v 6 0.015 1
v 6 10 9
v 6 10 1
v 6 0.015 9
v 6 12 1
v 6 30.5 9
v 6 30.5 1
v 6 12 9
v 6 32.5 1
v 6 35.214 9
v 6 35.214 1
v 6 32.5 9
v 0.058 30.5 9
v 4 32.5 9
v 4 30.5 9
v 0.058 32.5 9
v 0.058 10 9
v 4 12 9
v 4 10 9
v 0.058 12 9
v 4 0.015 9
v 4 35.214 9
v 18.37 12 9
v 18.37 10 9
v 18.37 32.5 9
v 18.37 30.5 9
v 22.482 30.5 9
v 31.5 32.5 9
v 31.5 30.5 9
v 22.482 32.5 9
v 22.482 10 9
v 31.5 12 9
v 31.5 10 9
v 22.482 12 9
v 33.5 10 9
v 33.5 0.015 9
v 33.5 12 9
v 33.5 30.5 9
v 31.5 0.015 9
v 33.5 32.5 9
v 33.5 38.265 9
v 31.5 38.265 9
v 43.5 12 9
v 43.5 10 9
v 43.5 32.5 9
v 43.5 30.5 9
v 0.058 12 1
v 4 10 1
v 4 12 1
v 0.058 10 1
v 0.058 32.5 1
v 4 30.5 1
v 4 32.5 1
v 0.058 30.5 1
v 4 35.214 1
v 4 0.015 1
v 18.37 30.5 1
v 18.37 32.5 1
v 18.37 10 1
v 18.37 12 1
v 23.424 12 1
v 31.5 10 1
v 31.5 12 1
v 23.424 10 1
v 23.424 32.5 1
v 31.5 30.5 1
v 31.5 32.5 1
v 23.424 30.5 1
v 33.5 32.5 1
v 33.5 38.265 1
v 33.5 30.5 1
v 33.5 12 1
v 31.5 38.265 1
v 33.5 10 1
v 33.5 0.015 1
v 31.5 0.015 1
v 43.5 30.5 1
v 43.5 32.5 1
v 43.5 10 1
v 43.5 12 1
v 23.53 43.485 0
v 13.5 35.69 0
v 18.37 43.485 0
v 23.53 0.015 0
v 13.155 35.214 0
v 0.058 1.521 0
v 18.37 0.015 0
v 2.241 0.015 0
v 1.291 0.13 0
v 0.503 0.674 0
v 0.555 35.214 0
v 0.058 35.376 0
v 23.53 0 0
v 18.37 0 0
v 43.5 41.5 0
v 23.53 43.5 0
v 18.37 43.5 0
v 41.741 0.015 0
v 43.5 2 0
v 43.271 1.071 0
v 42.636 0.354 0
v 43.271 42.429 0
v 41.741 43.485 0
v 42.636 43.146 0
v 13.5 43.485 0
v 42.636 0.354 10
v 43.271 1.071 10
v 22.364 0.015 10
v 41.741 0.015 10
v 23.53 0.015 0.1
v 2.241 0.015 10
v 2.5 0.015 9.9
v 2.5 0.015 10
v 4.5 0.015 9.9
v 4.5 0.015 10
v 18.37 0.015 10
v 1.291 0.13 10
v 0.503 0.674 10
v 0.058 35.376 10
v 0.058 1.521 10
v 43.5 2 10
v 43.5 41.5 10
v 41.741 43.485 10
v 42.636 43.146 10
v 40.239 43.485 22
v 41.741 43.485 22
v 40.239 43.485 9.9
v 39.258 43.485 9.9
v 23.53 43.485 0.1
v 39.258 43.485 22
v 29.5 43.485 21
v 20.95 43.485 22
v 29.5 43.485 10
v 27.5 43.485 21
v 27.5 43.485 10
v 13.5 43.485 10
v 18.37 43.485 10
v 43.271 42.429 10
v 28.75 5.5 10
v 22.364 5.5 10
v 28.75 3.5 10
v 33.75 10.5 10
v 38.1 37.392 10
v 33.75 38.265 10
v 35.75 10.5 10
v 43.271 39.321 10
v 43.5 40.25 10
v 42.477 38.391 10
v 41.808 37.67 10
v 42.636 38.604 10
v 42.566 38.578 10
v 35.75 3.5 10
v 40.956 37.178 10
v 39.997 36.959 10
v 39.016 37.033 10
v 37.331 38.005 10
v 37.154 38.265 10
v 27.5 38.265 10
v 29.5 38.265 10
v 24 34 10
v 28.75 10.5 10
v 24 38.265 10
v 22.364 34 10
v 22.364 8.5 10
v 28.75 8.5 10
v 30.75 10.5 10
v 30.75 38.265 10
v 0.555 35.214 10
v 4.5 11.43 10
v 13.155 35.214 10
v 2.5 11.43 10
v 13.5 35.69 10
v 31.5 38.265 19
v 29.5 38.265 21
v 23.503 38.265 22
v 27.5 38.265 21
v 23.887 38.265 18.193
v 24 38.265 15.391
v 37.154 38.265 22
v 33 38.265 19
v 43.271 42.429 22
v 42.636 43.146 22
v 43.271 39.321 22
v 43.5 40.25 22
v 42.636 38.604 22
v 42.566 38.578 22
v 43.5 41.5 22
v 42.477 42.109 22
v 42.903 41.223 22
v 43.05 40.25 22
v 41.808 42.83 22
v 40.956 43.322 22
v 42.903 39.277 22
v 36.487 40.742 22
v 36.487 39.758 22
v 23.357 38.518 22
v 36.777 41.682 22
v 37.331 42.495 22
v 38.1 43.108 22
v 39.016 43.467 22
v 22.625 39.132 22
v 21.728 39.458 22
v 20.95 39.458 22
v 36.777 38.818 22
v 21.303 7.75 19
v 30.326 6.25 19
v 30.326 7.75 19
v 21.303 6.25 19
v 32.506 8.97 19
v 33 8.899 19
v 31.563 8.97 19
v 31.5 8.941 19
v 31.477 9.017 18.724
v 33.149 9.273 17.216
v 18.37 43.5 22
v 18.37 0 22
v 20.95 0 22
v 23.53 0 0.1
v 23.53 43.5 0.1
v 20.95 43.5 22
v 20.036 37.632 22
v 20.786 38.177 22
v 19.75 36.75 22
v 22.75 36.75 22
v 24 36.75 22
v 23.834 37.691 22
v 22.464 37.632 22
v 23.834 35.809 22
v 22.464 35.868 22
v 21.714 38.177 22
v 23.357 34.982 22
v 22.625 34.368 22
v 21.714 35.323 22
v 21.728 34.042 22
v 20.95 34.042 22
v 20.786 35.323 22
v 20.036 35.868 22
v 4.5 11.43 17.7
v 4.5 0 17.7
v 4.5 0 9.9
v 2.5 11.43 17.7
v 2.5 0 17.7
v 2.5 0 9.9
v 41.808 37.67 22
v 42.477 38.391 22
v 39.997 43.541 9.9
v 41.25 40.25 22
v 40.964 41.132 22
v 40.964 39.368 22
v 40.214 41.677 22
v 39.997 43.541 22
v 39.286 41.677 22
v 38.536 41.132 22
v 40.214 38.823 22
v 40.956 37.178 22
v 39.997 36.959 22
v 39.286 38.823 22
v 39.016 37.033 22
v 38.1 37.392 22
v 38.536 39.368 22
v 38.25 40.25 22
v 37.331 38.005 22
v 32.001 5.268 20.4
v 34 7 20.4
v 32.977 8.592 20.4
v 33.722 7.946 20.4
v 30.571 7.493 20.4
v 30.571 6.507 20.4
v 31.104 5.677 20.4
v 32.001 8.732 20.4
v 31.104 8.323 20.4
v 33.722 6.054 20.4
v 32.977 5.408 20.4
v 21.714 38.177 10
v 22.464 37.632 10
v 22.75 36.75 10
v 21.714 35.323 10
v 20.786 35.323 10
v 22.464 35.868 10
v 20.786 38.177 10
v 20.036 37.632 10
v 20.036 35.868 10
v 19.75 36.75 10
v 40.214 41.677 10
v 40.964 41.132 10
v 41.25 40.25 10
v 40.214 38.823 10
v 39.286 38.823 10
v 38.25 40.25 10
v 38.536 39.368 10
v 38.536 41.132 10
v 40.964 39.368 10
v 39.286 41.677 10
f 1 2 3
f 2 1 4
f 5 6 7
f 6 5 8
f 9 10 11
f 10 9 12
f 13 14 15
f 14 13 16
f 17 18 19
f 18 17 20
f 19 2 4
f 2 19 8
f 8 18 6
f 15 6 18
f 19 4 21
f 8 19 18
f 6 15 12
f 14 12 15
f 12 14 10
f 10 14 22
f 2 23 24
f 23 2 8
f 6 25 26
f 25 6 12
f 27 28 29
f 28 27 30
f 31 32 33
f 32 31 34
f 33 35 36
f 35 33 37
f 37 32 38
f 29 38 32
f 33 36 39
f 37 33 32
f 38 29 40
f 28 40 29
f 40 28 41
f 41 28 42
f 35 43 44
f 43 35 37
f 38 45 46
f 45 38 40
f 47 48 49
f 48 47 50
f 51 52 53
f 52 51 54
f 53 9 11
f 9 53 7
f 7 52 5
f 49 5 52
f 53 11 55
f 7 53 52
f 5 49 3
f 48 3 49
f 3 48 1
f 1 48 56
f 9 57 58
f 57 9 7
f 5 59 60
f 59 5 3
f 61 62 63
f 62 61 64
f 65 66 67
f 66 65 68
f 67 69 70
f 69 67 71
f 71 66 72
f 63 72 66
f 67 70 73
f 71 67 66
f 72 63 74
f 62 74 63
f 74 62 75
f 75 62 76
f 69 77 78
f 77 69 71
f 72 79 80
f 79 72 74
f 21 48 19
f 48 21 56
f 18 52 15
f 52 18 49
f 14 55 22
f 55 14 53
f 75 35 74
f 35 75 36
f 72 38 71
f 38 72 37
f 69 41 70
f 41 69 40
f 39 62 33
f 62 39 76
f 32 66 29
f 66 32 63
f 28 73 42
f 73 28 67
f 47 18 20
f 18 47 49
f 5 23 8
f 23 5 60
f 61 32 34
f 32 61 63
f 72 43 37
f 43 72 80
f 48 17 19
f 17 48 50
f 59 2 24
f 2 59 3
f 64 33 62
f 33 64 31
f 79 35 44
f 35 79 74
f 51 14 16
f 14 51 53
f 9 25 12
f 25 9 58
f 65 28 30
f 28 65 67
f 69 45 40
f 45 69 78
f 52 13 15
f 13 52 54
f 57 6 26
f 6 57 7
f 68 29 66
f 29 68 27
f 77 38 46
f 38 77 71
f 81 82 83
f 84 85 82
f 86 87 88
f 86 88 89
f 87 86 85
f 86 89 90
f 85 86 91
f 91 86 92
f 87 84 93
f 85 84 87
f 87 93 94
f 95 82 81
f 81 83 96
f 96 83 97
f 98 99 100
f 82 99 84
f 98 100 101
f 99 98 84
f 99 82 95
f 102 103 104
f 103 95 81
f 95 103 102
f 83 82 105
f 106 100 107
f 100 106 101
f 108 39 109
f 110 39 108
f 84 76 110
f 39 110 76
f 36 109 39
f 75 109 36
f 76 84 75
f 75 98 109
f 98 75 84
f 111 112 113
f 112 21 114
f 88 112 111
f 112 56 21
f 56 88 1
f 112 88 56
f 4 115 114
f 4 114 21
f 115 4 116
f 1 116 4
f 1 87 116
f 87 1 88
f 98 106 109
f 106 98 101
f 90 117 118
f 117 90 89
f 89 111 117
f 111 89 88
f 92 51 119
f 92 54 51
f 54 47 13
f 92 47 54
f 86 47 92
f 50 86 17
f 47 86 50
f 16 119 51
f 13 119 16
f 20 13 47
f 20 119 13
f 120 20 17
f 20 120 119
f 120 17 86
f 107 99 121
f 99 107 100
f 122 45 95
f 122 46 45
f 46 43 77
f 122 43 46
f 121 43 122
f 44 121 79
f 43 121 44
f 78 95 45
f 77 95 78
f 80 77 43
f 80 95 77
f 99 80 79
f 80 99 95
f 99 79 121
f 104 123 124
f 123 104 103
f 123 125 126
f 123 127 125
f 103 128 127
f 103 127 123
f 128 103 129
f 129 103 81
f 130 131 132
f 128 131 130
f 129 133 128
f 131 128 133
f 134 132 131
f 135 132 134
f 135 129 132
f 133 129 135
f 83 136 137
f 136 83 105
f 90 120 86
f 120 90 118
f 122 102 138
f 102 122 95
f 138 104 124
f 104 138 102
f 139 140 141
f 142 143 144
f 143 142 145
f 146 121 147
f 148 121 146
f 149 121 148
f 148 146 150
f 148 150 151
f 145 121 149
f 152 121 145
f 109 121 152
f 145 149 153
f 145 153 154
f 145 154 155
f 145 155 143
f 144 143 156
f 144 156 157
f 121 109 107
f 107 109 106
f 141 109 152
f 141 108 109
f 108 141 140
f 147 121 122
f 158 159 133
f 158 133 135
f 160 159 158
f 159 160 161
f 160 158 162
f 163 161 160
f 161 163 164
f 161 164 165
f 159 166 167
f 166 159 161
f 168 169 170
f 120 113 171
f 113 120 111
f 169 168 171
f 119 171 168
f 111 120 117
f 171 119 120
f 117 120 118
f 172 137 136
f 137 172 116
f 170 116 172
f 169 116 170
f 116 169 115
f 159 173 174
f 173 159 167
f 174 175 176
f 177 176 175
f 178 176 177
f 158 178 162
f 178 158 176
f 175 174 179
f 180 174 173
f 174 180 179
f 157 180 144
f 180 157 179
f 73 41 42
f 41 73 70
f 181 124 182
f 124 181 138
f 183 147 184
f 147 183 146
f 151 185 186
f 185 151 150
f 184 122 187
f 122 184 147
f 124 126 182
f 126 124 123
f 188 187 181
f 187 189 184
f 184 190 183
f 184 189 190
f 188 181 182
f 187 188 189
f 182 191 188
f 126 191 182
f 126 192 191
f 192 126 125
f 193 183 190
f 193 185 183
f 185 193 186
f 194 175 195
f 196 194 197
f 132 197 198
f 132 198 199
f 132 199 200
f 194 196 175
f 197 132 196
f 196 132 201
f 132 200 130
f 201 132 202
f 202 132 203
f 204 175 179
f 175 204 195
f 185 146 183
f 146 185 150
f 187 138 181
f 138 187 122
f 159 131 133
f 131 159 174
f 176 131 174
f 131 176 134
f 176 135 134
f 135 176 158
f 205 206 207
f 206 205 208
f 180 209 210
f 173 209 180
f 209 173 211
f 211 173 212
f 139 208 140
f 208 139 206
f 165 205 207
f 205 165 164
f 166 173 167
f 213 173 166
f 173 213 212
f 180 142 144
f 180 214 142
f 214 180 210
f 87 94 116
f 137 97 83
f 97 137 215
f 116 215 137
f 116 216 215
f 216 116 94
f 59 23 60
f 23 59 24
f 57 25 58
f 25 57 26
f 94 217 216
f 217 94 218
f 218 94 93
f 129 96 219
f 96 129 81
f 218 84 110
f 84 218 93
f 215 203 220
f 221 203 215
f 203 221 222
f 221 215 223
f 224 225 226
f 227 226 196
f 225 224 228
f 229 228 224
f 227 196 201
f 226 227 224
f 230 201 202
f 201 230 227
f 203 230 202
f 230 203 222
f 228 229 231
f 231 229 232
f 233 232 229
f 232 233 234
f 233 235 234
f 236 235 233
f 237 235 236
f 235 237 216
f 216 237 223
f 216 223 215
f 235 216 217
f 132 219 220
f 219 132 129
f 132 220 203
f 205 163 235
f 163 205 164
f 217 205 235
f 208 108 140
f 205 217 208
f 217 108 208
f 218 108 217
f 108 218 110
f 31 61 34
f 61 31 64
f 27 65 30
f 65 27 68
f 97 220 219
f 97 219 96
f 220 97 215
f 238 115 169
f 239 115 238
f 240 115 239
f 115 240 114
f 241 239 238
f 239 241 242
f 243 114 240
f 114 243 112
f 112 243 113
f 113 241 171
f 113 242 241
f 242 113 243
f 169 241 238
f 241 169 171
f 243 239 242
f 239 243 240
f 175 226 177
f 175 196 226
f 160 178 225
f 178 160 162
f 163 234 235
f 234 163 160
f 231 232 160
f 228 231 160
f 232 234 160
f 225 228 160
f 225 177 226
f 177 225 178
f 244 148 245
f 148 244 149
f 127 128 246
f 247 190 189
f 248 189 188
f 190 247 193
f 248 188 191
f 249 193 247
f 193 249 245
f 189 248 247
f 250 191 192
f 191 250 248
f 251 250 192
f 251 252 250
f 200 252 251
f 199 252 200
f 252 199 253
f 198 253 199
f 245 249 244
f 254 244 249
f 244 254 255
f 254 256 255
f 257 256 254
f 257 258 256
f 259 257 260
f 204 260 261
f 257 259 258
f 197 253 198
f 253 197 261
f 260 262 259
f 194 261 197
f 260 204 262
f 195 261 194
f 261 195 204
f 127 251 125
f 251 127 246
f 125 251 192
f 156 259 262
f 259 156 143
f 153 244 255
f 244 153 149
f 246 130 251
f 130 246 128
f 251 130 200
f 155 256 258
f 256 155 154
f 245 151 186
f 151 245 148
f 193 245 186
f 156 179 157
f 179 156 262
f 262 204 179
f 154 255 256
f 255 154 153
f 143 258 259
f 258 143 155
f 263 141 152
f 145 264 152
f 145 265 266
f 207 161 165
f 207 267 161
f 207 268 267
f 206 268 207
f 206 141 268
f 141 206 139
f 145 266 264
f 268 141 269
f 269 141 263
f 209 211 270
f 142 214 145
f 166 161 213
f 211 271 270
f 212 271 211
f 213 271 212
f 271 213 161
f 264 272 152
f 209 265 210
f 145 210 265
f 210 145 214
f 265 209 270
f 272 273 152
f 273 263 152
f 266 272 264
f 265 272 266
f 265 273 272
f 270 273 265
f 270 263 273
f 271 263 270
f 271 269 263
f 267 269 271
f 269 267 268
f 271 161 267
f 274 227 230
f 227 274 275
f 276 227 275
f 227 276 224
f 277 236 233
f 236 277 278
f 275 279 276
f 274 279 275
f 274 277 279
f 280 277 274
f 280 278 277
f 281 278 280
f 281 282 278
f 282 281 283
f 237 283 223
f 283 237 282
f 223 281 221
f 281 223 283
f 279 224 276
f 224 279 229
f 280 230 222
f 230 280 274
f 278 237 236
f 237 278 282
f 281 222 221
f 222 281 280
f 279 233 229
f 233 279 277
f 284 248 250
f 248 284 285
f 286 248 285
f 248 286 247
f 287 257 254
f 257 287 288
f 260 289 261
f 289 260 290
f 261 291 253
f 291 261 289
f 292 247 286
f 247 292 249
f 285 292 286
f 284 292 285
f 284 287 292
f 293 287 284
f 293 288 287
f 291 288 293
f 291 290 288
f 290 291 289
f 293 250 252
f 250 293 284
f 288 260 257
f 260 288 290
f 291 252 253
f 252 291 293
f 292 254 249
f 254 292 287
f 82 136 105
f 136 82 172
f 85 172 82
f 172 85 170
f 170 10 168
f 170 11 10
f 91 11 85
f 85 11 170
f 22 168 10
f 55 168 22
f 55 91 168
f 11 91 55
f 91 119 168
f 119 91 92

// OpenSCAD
hq = true;
clr = 0.2;

$fs = hq ? 1 : 4;
$fa = hq ? 1 : 4;
eps = 0.1;

// Constants from the Eagle file

// Board dimensions
board_x = 0;
board_y = 0;
board_w = 43.5;
board_h = 43.5;
board_r = 2;

// Teensy location
teensy_cx =  9.08;
teensy_cy = 19.05;
teensy_w =  7 * 2.54;
teensy_h = 14 * 2.54;
teensy_paddle_w = 20.75;

// Tactile switches
sw1_x = 32.25;
sw1_y = 7;
swlast_x = sw1_x;
sw_d = 2.5;

// Screw holes
hole1_x = 21.25;
hole1_y = 36.75;

hole2_x = 39.75;
hole2_y = 40.25;

hole_d = 3;
hole_clr = 0;

// Paddles
paddle_y = 3.5;

// Spine
spine_y = 38.25;
spine_cx2 = (37.25 + 48.5) / 2;
spine_cx3 = (58.75 + 66.72) / 2;

// Header
header_cx = 7.79;
header_cy = 39.73;
header_w = 3 * 2.54;
header_h = 2 * 2.54;

// End Eagle constants

teensy_rx = teensy_cx + teensy_w / 2 + clr; // Teensy right side x coord.

// Z heights
base_z = 1 + 7 + 2;
deck_z = base_z + 9 + 3;
sw_z = deck_z - 1.6;
teensy_z = deck_z - 4.1;
bulkhead_z = deck_z - 3;

module centered_cube(size, zt=0) {
    translate([-size[0] / 2, -size[1] / 2, zt])
        cube(size);
}

module round_rect(size, r) {
    hull()
        for (x = [r, size[0] - r]) for ( y = [r, size[1] - r]) {
            translate([x, y, 0])
                cylinder(r=r, h=size[2]);
        }
}


module base() {
    difference() {
        round_rect([board_w, board_h, base_z], board_r);
        for (x = [4, 20, board_w - 12])
            translate([x, -eps, 1])
                cube([2, board_h + 2 * eps, base_z - 2]);
        for (y = [10, board_h - 13])
            translate([-eps, y, 1])
                cube([board_w + 2 * eps, 2, base_z - 2]);
    }
}

module spine() {
    lx = teensy_rx + clr;
    difference() {
        translate([lx, spine_y, eps])
            round_rect([board_w - lx, board_h - spine_y, deck_z - eps],
                       r=board_r);
        // strain relief
        translate([board_w - 16, spine_y - eps, base_z])
            cube([2, board_h, deck_z - base_z - 1]);
    }
}

module bulkheads() {
    bt0 = 3;
    bt1 = 1.5;
    bx = teensy_rx + clr;
    by = sw1_y;
    bw = swlast_x - bx;
    bh = board_h - by;
    translate([bx + eps, by, 0])
        hull() {
            translate([0, -bt0/2, base_z - eps])
                cube([bw + bt0/2, bt0, eps]);
            translate([0, -bt1/2, bulkhead_z - eps])
                cube([bw + bt1/2, bt1, eps]);
        }
    translate([bx + bw, board_h, 0])
        rotate(-90)
            hull() {
                translate([eps, -bt0/2, base_z - eps])
                    cube([bh + bt0/2 - eps, bt0, eps]);
                translate([eps, -bt1/2, bulkhead_z - eps])
                    cube([bh + bt1/2 - eps, bt1, eps]);
            }
}

module screw_support(x, y, z) {
    support_d = hole_d + 2.5;
    hull() {
        translate([x, y, base_z - eps])
            centered_cube([support_d, support_d, eps]);
        translate([x, y, z - eps])
            cylinder(d=support_d, h = eps);
    }
}

module end_screw_support(x, y ,z) {
    support_d = 6.6;
    translate([x, y, base_z - eps])
        cylinder(d = support_d, h = z - base_z + eps);
}

module screw_supports() {
    screw_support(hole1_x, hole1_y, deck_z);
    end_screw_support(hole2_x, hole2_y, deck_z);
}

module screw_hole(x, y, z) {
    translate([x, y, z])
        cylinder(d=hole_d + hole_clr, h=deck_z + 3);
}

module screw_holes() {
    screw_hole(hole1_x, hole1_y, base_z);
    screw_hole(hole2_x, hole2_y, base_z);
}

module switch_pillars() {
    module switch_pillar(x, y) {
        mbh = 2 * (y - paddle_y);
        mbw = mbh;
        translate([x, y, 0])
            hull() {
                centered_cube([mbw, mbh, eps], zt=base_z - eps);
                translate([0, 0, sw_z - eps])
                    cylinder(d=sw_d + 1, h=eps);
            }
    }
    switch_pillar(sw1_x, sw1_y);
}

module under_teensy() {
    uw = teensy_paddle_w - teensy_rx;
    translate([teensy_rx + clr, 0, 0])
        hull() {
            cube([2 * uw, board_h, eps]);
            translate([0, 0, deck_z - eps])
                cube([uw, board_h, eps]);
        }
    translate([2.5, 0, base_z - eps])
        cube([2, 4.5 * 2.54, teensy_z - base_z - eps]);
}

module header_cutout() {
    hdr_clr = 2;
    translate([-eps, header_cy - header_h / 2 - hdr_clr, -eps])
        round_rect([header_cx + header_w / 2 + hdr_clr,
                    board_h,
                    deck_z + 2 * eps],
                   r=0.5);
}

module substrate() {
    difference() {
        union() {
            base();
            spine();
            bulkheads();
            switch_pillars();
            under_teensy();
            screw_supports();
        };
        screw_holes();
        header_cutout();
    };
}

substrate();
